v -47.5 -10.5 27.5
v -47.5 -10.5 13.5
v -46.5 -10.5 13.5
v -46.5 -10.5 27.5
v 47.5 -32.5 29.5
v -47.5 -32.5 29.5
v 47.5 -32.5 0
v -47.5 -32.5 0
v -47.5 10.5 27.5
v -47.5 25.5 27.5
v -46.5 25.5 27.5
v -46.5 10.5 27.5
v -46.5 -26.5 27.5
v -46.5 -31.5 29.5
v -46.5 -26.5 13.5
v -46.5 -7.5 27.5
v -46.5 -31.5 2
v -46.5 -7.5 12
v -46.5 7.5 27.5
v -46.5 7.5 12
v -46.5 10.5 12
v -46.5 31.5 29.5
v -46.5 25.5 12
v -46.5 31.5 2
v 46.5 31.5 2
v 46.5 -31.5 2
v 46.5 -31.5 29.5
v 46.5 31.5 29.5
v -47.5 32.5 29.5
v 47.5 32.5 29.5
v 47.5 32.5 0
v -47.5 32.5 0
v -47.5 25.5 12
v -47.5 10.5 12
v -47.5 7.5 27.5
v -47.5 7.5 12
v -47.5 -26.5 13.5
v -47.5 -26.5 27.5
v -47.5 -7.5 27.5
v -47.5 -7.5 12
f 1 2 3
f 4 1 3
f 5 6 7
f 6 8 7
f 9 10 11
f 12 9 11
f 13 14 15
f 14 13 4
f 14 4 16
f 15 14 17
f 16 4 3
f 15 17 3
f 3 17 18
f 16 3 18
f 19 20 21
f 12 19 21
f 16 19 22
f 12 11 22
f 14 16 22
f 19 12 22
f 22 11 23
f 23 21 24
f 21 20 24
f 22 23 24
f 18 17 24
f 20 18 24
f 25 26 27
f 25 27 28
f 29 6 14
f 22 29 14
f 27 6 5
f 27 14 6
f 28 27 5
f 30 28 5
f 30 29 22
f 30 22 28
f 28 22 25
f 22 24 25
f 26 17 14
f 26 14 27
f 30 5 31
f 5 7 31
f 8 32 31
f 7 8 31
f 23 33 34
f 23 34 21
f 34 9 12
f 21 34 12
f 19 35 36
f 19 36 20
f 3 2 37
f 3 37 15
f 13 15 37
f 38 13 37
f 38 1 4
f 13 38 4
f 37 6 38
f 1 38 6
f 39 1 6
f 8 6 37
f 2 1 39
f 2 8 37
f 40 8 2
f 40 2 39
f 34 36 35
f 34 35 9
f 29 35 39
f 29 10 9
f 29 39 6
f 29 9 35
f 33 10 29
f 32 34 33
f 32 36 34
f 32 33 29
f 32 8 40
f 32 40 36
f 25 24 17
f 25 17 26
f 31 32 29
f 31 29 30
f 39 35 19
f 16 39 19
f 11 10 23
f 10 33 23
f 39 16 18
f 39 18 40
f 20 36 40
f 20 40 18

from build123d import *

# Parameters (mm, degrees)
F0_W     = 95
F0_H     = 65
F0_W_2   = 93
F0_H_2   = 63
F1_DEPTH = 12
F2_DEPTH = 2
F3_W     = 1
F3_H     = 3
F4_DEPTH = 1.5
F5_W     = 1
F5_H     = 3
F6_DEPTH = 14
F7_W     = 95
F7_H     = 65
F7_W_2   = 93
F7_H_2   = 63
F8_DEPTH = 2


with BuildPart() as f1:
    # F0 (on Top) → F1 (new body)
    with BuildSketch(Plane.XY):
        Rectangle(F0_W, F0_H)
        Rectangle(F0_W_2, F0_H_2, mode=Mode.SUBTRACT)
    extrude(amount=F1_DEPTH)

    # F0 (on Top) → F2 (join)
    with BuildSketch(Plane.XY):
        Rectangle(F0_W_2, F0_H_2)
    extrude(amount=F2_DEPTH)

    # F3 (on face) → F4 (join)
    with BuildSketch(Plane.XY.offset(12)):
        Polygon((47.5, 32.5), (-47.5, 32.5), (-47.5, 25.5), (-46.5, 25.5), (-46.5, 31.5), (46.5, 31.5), (46.5, -31.5), (-46.5, -31.5), (-46.5, -7.5), (-47.5, -7.5), (-47.5, -32.5), (47.5, -32.5), align=None)
        with Locations((-47, 9)):
            Rectangle(F3_W, F3_H)
    extrude(amount=F4_DEPTH)

    # F5 (on face) → F6 (join)
    with BuildSketch(Plane.XY.offset(13.5)):
        Polygon((47.5, -32.5), (47.5, 32.5), (-47.5, 32.5), (-47.5, 25.5), (-46.5, 25.5), (-46.5, 31.5), (46.5, 31.5), (46.5, -31.5), (-46.5, -31.5), (-46.5, -26.5), (-47.5, -26.5), (-47.5, -32.5), align=None)
        with Locations((-47, -9)):
            Rectangle(F5_W, F5_H)
        with Locations((-47, 9)):
            Rectangle(F5_W, F5_H)
    extrude(amount=F6_DEPTH)

    # F7 (on face) → F8 (join)
    with BuildSketch(Plane.XY.offset(27.5)):
        Rectangle(F7_W, F7_H)
        Rectangle(F7_W_2, F7_H_2, mode=Mode.SUBTRACT)
    extrude(amount=F8_DEPTH)


solid = f1.part
